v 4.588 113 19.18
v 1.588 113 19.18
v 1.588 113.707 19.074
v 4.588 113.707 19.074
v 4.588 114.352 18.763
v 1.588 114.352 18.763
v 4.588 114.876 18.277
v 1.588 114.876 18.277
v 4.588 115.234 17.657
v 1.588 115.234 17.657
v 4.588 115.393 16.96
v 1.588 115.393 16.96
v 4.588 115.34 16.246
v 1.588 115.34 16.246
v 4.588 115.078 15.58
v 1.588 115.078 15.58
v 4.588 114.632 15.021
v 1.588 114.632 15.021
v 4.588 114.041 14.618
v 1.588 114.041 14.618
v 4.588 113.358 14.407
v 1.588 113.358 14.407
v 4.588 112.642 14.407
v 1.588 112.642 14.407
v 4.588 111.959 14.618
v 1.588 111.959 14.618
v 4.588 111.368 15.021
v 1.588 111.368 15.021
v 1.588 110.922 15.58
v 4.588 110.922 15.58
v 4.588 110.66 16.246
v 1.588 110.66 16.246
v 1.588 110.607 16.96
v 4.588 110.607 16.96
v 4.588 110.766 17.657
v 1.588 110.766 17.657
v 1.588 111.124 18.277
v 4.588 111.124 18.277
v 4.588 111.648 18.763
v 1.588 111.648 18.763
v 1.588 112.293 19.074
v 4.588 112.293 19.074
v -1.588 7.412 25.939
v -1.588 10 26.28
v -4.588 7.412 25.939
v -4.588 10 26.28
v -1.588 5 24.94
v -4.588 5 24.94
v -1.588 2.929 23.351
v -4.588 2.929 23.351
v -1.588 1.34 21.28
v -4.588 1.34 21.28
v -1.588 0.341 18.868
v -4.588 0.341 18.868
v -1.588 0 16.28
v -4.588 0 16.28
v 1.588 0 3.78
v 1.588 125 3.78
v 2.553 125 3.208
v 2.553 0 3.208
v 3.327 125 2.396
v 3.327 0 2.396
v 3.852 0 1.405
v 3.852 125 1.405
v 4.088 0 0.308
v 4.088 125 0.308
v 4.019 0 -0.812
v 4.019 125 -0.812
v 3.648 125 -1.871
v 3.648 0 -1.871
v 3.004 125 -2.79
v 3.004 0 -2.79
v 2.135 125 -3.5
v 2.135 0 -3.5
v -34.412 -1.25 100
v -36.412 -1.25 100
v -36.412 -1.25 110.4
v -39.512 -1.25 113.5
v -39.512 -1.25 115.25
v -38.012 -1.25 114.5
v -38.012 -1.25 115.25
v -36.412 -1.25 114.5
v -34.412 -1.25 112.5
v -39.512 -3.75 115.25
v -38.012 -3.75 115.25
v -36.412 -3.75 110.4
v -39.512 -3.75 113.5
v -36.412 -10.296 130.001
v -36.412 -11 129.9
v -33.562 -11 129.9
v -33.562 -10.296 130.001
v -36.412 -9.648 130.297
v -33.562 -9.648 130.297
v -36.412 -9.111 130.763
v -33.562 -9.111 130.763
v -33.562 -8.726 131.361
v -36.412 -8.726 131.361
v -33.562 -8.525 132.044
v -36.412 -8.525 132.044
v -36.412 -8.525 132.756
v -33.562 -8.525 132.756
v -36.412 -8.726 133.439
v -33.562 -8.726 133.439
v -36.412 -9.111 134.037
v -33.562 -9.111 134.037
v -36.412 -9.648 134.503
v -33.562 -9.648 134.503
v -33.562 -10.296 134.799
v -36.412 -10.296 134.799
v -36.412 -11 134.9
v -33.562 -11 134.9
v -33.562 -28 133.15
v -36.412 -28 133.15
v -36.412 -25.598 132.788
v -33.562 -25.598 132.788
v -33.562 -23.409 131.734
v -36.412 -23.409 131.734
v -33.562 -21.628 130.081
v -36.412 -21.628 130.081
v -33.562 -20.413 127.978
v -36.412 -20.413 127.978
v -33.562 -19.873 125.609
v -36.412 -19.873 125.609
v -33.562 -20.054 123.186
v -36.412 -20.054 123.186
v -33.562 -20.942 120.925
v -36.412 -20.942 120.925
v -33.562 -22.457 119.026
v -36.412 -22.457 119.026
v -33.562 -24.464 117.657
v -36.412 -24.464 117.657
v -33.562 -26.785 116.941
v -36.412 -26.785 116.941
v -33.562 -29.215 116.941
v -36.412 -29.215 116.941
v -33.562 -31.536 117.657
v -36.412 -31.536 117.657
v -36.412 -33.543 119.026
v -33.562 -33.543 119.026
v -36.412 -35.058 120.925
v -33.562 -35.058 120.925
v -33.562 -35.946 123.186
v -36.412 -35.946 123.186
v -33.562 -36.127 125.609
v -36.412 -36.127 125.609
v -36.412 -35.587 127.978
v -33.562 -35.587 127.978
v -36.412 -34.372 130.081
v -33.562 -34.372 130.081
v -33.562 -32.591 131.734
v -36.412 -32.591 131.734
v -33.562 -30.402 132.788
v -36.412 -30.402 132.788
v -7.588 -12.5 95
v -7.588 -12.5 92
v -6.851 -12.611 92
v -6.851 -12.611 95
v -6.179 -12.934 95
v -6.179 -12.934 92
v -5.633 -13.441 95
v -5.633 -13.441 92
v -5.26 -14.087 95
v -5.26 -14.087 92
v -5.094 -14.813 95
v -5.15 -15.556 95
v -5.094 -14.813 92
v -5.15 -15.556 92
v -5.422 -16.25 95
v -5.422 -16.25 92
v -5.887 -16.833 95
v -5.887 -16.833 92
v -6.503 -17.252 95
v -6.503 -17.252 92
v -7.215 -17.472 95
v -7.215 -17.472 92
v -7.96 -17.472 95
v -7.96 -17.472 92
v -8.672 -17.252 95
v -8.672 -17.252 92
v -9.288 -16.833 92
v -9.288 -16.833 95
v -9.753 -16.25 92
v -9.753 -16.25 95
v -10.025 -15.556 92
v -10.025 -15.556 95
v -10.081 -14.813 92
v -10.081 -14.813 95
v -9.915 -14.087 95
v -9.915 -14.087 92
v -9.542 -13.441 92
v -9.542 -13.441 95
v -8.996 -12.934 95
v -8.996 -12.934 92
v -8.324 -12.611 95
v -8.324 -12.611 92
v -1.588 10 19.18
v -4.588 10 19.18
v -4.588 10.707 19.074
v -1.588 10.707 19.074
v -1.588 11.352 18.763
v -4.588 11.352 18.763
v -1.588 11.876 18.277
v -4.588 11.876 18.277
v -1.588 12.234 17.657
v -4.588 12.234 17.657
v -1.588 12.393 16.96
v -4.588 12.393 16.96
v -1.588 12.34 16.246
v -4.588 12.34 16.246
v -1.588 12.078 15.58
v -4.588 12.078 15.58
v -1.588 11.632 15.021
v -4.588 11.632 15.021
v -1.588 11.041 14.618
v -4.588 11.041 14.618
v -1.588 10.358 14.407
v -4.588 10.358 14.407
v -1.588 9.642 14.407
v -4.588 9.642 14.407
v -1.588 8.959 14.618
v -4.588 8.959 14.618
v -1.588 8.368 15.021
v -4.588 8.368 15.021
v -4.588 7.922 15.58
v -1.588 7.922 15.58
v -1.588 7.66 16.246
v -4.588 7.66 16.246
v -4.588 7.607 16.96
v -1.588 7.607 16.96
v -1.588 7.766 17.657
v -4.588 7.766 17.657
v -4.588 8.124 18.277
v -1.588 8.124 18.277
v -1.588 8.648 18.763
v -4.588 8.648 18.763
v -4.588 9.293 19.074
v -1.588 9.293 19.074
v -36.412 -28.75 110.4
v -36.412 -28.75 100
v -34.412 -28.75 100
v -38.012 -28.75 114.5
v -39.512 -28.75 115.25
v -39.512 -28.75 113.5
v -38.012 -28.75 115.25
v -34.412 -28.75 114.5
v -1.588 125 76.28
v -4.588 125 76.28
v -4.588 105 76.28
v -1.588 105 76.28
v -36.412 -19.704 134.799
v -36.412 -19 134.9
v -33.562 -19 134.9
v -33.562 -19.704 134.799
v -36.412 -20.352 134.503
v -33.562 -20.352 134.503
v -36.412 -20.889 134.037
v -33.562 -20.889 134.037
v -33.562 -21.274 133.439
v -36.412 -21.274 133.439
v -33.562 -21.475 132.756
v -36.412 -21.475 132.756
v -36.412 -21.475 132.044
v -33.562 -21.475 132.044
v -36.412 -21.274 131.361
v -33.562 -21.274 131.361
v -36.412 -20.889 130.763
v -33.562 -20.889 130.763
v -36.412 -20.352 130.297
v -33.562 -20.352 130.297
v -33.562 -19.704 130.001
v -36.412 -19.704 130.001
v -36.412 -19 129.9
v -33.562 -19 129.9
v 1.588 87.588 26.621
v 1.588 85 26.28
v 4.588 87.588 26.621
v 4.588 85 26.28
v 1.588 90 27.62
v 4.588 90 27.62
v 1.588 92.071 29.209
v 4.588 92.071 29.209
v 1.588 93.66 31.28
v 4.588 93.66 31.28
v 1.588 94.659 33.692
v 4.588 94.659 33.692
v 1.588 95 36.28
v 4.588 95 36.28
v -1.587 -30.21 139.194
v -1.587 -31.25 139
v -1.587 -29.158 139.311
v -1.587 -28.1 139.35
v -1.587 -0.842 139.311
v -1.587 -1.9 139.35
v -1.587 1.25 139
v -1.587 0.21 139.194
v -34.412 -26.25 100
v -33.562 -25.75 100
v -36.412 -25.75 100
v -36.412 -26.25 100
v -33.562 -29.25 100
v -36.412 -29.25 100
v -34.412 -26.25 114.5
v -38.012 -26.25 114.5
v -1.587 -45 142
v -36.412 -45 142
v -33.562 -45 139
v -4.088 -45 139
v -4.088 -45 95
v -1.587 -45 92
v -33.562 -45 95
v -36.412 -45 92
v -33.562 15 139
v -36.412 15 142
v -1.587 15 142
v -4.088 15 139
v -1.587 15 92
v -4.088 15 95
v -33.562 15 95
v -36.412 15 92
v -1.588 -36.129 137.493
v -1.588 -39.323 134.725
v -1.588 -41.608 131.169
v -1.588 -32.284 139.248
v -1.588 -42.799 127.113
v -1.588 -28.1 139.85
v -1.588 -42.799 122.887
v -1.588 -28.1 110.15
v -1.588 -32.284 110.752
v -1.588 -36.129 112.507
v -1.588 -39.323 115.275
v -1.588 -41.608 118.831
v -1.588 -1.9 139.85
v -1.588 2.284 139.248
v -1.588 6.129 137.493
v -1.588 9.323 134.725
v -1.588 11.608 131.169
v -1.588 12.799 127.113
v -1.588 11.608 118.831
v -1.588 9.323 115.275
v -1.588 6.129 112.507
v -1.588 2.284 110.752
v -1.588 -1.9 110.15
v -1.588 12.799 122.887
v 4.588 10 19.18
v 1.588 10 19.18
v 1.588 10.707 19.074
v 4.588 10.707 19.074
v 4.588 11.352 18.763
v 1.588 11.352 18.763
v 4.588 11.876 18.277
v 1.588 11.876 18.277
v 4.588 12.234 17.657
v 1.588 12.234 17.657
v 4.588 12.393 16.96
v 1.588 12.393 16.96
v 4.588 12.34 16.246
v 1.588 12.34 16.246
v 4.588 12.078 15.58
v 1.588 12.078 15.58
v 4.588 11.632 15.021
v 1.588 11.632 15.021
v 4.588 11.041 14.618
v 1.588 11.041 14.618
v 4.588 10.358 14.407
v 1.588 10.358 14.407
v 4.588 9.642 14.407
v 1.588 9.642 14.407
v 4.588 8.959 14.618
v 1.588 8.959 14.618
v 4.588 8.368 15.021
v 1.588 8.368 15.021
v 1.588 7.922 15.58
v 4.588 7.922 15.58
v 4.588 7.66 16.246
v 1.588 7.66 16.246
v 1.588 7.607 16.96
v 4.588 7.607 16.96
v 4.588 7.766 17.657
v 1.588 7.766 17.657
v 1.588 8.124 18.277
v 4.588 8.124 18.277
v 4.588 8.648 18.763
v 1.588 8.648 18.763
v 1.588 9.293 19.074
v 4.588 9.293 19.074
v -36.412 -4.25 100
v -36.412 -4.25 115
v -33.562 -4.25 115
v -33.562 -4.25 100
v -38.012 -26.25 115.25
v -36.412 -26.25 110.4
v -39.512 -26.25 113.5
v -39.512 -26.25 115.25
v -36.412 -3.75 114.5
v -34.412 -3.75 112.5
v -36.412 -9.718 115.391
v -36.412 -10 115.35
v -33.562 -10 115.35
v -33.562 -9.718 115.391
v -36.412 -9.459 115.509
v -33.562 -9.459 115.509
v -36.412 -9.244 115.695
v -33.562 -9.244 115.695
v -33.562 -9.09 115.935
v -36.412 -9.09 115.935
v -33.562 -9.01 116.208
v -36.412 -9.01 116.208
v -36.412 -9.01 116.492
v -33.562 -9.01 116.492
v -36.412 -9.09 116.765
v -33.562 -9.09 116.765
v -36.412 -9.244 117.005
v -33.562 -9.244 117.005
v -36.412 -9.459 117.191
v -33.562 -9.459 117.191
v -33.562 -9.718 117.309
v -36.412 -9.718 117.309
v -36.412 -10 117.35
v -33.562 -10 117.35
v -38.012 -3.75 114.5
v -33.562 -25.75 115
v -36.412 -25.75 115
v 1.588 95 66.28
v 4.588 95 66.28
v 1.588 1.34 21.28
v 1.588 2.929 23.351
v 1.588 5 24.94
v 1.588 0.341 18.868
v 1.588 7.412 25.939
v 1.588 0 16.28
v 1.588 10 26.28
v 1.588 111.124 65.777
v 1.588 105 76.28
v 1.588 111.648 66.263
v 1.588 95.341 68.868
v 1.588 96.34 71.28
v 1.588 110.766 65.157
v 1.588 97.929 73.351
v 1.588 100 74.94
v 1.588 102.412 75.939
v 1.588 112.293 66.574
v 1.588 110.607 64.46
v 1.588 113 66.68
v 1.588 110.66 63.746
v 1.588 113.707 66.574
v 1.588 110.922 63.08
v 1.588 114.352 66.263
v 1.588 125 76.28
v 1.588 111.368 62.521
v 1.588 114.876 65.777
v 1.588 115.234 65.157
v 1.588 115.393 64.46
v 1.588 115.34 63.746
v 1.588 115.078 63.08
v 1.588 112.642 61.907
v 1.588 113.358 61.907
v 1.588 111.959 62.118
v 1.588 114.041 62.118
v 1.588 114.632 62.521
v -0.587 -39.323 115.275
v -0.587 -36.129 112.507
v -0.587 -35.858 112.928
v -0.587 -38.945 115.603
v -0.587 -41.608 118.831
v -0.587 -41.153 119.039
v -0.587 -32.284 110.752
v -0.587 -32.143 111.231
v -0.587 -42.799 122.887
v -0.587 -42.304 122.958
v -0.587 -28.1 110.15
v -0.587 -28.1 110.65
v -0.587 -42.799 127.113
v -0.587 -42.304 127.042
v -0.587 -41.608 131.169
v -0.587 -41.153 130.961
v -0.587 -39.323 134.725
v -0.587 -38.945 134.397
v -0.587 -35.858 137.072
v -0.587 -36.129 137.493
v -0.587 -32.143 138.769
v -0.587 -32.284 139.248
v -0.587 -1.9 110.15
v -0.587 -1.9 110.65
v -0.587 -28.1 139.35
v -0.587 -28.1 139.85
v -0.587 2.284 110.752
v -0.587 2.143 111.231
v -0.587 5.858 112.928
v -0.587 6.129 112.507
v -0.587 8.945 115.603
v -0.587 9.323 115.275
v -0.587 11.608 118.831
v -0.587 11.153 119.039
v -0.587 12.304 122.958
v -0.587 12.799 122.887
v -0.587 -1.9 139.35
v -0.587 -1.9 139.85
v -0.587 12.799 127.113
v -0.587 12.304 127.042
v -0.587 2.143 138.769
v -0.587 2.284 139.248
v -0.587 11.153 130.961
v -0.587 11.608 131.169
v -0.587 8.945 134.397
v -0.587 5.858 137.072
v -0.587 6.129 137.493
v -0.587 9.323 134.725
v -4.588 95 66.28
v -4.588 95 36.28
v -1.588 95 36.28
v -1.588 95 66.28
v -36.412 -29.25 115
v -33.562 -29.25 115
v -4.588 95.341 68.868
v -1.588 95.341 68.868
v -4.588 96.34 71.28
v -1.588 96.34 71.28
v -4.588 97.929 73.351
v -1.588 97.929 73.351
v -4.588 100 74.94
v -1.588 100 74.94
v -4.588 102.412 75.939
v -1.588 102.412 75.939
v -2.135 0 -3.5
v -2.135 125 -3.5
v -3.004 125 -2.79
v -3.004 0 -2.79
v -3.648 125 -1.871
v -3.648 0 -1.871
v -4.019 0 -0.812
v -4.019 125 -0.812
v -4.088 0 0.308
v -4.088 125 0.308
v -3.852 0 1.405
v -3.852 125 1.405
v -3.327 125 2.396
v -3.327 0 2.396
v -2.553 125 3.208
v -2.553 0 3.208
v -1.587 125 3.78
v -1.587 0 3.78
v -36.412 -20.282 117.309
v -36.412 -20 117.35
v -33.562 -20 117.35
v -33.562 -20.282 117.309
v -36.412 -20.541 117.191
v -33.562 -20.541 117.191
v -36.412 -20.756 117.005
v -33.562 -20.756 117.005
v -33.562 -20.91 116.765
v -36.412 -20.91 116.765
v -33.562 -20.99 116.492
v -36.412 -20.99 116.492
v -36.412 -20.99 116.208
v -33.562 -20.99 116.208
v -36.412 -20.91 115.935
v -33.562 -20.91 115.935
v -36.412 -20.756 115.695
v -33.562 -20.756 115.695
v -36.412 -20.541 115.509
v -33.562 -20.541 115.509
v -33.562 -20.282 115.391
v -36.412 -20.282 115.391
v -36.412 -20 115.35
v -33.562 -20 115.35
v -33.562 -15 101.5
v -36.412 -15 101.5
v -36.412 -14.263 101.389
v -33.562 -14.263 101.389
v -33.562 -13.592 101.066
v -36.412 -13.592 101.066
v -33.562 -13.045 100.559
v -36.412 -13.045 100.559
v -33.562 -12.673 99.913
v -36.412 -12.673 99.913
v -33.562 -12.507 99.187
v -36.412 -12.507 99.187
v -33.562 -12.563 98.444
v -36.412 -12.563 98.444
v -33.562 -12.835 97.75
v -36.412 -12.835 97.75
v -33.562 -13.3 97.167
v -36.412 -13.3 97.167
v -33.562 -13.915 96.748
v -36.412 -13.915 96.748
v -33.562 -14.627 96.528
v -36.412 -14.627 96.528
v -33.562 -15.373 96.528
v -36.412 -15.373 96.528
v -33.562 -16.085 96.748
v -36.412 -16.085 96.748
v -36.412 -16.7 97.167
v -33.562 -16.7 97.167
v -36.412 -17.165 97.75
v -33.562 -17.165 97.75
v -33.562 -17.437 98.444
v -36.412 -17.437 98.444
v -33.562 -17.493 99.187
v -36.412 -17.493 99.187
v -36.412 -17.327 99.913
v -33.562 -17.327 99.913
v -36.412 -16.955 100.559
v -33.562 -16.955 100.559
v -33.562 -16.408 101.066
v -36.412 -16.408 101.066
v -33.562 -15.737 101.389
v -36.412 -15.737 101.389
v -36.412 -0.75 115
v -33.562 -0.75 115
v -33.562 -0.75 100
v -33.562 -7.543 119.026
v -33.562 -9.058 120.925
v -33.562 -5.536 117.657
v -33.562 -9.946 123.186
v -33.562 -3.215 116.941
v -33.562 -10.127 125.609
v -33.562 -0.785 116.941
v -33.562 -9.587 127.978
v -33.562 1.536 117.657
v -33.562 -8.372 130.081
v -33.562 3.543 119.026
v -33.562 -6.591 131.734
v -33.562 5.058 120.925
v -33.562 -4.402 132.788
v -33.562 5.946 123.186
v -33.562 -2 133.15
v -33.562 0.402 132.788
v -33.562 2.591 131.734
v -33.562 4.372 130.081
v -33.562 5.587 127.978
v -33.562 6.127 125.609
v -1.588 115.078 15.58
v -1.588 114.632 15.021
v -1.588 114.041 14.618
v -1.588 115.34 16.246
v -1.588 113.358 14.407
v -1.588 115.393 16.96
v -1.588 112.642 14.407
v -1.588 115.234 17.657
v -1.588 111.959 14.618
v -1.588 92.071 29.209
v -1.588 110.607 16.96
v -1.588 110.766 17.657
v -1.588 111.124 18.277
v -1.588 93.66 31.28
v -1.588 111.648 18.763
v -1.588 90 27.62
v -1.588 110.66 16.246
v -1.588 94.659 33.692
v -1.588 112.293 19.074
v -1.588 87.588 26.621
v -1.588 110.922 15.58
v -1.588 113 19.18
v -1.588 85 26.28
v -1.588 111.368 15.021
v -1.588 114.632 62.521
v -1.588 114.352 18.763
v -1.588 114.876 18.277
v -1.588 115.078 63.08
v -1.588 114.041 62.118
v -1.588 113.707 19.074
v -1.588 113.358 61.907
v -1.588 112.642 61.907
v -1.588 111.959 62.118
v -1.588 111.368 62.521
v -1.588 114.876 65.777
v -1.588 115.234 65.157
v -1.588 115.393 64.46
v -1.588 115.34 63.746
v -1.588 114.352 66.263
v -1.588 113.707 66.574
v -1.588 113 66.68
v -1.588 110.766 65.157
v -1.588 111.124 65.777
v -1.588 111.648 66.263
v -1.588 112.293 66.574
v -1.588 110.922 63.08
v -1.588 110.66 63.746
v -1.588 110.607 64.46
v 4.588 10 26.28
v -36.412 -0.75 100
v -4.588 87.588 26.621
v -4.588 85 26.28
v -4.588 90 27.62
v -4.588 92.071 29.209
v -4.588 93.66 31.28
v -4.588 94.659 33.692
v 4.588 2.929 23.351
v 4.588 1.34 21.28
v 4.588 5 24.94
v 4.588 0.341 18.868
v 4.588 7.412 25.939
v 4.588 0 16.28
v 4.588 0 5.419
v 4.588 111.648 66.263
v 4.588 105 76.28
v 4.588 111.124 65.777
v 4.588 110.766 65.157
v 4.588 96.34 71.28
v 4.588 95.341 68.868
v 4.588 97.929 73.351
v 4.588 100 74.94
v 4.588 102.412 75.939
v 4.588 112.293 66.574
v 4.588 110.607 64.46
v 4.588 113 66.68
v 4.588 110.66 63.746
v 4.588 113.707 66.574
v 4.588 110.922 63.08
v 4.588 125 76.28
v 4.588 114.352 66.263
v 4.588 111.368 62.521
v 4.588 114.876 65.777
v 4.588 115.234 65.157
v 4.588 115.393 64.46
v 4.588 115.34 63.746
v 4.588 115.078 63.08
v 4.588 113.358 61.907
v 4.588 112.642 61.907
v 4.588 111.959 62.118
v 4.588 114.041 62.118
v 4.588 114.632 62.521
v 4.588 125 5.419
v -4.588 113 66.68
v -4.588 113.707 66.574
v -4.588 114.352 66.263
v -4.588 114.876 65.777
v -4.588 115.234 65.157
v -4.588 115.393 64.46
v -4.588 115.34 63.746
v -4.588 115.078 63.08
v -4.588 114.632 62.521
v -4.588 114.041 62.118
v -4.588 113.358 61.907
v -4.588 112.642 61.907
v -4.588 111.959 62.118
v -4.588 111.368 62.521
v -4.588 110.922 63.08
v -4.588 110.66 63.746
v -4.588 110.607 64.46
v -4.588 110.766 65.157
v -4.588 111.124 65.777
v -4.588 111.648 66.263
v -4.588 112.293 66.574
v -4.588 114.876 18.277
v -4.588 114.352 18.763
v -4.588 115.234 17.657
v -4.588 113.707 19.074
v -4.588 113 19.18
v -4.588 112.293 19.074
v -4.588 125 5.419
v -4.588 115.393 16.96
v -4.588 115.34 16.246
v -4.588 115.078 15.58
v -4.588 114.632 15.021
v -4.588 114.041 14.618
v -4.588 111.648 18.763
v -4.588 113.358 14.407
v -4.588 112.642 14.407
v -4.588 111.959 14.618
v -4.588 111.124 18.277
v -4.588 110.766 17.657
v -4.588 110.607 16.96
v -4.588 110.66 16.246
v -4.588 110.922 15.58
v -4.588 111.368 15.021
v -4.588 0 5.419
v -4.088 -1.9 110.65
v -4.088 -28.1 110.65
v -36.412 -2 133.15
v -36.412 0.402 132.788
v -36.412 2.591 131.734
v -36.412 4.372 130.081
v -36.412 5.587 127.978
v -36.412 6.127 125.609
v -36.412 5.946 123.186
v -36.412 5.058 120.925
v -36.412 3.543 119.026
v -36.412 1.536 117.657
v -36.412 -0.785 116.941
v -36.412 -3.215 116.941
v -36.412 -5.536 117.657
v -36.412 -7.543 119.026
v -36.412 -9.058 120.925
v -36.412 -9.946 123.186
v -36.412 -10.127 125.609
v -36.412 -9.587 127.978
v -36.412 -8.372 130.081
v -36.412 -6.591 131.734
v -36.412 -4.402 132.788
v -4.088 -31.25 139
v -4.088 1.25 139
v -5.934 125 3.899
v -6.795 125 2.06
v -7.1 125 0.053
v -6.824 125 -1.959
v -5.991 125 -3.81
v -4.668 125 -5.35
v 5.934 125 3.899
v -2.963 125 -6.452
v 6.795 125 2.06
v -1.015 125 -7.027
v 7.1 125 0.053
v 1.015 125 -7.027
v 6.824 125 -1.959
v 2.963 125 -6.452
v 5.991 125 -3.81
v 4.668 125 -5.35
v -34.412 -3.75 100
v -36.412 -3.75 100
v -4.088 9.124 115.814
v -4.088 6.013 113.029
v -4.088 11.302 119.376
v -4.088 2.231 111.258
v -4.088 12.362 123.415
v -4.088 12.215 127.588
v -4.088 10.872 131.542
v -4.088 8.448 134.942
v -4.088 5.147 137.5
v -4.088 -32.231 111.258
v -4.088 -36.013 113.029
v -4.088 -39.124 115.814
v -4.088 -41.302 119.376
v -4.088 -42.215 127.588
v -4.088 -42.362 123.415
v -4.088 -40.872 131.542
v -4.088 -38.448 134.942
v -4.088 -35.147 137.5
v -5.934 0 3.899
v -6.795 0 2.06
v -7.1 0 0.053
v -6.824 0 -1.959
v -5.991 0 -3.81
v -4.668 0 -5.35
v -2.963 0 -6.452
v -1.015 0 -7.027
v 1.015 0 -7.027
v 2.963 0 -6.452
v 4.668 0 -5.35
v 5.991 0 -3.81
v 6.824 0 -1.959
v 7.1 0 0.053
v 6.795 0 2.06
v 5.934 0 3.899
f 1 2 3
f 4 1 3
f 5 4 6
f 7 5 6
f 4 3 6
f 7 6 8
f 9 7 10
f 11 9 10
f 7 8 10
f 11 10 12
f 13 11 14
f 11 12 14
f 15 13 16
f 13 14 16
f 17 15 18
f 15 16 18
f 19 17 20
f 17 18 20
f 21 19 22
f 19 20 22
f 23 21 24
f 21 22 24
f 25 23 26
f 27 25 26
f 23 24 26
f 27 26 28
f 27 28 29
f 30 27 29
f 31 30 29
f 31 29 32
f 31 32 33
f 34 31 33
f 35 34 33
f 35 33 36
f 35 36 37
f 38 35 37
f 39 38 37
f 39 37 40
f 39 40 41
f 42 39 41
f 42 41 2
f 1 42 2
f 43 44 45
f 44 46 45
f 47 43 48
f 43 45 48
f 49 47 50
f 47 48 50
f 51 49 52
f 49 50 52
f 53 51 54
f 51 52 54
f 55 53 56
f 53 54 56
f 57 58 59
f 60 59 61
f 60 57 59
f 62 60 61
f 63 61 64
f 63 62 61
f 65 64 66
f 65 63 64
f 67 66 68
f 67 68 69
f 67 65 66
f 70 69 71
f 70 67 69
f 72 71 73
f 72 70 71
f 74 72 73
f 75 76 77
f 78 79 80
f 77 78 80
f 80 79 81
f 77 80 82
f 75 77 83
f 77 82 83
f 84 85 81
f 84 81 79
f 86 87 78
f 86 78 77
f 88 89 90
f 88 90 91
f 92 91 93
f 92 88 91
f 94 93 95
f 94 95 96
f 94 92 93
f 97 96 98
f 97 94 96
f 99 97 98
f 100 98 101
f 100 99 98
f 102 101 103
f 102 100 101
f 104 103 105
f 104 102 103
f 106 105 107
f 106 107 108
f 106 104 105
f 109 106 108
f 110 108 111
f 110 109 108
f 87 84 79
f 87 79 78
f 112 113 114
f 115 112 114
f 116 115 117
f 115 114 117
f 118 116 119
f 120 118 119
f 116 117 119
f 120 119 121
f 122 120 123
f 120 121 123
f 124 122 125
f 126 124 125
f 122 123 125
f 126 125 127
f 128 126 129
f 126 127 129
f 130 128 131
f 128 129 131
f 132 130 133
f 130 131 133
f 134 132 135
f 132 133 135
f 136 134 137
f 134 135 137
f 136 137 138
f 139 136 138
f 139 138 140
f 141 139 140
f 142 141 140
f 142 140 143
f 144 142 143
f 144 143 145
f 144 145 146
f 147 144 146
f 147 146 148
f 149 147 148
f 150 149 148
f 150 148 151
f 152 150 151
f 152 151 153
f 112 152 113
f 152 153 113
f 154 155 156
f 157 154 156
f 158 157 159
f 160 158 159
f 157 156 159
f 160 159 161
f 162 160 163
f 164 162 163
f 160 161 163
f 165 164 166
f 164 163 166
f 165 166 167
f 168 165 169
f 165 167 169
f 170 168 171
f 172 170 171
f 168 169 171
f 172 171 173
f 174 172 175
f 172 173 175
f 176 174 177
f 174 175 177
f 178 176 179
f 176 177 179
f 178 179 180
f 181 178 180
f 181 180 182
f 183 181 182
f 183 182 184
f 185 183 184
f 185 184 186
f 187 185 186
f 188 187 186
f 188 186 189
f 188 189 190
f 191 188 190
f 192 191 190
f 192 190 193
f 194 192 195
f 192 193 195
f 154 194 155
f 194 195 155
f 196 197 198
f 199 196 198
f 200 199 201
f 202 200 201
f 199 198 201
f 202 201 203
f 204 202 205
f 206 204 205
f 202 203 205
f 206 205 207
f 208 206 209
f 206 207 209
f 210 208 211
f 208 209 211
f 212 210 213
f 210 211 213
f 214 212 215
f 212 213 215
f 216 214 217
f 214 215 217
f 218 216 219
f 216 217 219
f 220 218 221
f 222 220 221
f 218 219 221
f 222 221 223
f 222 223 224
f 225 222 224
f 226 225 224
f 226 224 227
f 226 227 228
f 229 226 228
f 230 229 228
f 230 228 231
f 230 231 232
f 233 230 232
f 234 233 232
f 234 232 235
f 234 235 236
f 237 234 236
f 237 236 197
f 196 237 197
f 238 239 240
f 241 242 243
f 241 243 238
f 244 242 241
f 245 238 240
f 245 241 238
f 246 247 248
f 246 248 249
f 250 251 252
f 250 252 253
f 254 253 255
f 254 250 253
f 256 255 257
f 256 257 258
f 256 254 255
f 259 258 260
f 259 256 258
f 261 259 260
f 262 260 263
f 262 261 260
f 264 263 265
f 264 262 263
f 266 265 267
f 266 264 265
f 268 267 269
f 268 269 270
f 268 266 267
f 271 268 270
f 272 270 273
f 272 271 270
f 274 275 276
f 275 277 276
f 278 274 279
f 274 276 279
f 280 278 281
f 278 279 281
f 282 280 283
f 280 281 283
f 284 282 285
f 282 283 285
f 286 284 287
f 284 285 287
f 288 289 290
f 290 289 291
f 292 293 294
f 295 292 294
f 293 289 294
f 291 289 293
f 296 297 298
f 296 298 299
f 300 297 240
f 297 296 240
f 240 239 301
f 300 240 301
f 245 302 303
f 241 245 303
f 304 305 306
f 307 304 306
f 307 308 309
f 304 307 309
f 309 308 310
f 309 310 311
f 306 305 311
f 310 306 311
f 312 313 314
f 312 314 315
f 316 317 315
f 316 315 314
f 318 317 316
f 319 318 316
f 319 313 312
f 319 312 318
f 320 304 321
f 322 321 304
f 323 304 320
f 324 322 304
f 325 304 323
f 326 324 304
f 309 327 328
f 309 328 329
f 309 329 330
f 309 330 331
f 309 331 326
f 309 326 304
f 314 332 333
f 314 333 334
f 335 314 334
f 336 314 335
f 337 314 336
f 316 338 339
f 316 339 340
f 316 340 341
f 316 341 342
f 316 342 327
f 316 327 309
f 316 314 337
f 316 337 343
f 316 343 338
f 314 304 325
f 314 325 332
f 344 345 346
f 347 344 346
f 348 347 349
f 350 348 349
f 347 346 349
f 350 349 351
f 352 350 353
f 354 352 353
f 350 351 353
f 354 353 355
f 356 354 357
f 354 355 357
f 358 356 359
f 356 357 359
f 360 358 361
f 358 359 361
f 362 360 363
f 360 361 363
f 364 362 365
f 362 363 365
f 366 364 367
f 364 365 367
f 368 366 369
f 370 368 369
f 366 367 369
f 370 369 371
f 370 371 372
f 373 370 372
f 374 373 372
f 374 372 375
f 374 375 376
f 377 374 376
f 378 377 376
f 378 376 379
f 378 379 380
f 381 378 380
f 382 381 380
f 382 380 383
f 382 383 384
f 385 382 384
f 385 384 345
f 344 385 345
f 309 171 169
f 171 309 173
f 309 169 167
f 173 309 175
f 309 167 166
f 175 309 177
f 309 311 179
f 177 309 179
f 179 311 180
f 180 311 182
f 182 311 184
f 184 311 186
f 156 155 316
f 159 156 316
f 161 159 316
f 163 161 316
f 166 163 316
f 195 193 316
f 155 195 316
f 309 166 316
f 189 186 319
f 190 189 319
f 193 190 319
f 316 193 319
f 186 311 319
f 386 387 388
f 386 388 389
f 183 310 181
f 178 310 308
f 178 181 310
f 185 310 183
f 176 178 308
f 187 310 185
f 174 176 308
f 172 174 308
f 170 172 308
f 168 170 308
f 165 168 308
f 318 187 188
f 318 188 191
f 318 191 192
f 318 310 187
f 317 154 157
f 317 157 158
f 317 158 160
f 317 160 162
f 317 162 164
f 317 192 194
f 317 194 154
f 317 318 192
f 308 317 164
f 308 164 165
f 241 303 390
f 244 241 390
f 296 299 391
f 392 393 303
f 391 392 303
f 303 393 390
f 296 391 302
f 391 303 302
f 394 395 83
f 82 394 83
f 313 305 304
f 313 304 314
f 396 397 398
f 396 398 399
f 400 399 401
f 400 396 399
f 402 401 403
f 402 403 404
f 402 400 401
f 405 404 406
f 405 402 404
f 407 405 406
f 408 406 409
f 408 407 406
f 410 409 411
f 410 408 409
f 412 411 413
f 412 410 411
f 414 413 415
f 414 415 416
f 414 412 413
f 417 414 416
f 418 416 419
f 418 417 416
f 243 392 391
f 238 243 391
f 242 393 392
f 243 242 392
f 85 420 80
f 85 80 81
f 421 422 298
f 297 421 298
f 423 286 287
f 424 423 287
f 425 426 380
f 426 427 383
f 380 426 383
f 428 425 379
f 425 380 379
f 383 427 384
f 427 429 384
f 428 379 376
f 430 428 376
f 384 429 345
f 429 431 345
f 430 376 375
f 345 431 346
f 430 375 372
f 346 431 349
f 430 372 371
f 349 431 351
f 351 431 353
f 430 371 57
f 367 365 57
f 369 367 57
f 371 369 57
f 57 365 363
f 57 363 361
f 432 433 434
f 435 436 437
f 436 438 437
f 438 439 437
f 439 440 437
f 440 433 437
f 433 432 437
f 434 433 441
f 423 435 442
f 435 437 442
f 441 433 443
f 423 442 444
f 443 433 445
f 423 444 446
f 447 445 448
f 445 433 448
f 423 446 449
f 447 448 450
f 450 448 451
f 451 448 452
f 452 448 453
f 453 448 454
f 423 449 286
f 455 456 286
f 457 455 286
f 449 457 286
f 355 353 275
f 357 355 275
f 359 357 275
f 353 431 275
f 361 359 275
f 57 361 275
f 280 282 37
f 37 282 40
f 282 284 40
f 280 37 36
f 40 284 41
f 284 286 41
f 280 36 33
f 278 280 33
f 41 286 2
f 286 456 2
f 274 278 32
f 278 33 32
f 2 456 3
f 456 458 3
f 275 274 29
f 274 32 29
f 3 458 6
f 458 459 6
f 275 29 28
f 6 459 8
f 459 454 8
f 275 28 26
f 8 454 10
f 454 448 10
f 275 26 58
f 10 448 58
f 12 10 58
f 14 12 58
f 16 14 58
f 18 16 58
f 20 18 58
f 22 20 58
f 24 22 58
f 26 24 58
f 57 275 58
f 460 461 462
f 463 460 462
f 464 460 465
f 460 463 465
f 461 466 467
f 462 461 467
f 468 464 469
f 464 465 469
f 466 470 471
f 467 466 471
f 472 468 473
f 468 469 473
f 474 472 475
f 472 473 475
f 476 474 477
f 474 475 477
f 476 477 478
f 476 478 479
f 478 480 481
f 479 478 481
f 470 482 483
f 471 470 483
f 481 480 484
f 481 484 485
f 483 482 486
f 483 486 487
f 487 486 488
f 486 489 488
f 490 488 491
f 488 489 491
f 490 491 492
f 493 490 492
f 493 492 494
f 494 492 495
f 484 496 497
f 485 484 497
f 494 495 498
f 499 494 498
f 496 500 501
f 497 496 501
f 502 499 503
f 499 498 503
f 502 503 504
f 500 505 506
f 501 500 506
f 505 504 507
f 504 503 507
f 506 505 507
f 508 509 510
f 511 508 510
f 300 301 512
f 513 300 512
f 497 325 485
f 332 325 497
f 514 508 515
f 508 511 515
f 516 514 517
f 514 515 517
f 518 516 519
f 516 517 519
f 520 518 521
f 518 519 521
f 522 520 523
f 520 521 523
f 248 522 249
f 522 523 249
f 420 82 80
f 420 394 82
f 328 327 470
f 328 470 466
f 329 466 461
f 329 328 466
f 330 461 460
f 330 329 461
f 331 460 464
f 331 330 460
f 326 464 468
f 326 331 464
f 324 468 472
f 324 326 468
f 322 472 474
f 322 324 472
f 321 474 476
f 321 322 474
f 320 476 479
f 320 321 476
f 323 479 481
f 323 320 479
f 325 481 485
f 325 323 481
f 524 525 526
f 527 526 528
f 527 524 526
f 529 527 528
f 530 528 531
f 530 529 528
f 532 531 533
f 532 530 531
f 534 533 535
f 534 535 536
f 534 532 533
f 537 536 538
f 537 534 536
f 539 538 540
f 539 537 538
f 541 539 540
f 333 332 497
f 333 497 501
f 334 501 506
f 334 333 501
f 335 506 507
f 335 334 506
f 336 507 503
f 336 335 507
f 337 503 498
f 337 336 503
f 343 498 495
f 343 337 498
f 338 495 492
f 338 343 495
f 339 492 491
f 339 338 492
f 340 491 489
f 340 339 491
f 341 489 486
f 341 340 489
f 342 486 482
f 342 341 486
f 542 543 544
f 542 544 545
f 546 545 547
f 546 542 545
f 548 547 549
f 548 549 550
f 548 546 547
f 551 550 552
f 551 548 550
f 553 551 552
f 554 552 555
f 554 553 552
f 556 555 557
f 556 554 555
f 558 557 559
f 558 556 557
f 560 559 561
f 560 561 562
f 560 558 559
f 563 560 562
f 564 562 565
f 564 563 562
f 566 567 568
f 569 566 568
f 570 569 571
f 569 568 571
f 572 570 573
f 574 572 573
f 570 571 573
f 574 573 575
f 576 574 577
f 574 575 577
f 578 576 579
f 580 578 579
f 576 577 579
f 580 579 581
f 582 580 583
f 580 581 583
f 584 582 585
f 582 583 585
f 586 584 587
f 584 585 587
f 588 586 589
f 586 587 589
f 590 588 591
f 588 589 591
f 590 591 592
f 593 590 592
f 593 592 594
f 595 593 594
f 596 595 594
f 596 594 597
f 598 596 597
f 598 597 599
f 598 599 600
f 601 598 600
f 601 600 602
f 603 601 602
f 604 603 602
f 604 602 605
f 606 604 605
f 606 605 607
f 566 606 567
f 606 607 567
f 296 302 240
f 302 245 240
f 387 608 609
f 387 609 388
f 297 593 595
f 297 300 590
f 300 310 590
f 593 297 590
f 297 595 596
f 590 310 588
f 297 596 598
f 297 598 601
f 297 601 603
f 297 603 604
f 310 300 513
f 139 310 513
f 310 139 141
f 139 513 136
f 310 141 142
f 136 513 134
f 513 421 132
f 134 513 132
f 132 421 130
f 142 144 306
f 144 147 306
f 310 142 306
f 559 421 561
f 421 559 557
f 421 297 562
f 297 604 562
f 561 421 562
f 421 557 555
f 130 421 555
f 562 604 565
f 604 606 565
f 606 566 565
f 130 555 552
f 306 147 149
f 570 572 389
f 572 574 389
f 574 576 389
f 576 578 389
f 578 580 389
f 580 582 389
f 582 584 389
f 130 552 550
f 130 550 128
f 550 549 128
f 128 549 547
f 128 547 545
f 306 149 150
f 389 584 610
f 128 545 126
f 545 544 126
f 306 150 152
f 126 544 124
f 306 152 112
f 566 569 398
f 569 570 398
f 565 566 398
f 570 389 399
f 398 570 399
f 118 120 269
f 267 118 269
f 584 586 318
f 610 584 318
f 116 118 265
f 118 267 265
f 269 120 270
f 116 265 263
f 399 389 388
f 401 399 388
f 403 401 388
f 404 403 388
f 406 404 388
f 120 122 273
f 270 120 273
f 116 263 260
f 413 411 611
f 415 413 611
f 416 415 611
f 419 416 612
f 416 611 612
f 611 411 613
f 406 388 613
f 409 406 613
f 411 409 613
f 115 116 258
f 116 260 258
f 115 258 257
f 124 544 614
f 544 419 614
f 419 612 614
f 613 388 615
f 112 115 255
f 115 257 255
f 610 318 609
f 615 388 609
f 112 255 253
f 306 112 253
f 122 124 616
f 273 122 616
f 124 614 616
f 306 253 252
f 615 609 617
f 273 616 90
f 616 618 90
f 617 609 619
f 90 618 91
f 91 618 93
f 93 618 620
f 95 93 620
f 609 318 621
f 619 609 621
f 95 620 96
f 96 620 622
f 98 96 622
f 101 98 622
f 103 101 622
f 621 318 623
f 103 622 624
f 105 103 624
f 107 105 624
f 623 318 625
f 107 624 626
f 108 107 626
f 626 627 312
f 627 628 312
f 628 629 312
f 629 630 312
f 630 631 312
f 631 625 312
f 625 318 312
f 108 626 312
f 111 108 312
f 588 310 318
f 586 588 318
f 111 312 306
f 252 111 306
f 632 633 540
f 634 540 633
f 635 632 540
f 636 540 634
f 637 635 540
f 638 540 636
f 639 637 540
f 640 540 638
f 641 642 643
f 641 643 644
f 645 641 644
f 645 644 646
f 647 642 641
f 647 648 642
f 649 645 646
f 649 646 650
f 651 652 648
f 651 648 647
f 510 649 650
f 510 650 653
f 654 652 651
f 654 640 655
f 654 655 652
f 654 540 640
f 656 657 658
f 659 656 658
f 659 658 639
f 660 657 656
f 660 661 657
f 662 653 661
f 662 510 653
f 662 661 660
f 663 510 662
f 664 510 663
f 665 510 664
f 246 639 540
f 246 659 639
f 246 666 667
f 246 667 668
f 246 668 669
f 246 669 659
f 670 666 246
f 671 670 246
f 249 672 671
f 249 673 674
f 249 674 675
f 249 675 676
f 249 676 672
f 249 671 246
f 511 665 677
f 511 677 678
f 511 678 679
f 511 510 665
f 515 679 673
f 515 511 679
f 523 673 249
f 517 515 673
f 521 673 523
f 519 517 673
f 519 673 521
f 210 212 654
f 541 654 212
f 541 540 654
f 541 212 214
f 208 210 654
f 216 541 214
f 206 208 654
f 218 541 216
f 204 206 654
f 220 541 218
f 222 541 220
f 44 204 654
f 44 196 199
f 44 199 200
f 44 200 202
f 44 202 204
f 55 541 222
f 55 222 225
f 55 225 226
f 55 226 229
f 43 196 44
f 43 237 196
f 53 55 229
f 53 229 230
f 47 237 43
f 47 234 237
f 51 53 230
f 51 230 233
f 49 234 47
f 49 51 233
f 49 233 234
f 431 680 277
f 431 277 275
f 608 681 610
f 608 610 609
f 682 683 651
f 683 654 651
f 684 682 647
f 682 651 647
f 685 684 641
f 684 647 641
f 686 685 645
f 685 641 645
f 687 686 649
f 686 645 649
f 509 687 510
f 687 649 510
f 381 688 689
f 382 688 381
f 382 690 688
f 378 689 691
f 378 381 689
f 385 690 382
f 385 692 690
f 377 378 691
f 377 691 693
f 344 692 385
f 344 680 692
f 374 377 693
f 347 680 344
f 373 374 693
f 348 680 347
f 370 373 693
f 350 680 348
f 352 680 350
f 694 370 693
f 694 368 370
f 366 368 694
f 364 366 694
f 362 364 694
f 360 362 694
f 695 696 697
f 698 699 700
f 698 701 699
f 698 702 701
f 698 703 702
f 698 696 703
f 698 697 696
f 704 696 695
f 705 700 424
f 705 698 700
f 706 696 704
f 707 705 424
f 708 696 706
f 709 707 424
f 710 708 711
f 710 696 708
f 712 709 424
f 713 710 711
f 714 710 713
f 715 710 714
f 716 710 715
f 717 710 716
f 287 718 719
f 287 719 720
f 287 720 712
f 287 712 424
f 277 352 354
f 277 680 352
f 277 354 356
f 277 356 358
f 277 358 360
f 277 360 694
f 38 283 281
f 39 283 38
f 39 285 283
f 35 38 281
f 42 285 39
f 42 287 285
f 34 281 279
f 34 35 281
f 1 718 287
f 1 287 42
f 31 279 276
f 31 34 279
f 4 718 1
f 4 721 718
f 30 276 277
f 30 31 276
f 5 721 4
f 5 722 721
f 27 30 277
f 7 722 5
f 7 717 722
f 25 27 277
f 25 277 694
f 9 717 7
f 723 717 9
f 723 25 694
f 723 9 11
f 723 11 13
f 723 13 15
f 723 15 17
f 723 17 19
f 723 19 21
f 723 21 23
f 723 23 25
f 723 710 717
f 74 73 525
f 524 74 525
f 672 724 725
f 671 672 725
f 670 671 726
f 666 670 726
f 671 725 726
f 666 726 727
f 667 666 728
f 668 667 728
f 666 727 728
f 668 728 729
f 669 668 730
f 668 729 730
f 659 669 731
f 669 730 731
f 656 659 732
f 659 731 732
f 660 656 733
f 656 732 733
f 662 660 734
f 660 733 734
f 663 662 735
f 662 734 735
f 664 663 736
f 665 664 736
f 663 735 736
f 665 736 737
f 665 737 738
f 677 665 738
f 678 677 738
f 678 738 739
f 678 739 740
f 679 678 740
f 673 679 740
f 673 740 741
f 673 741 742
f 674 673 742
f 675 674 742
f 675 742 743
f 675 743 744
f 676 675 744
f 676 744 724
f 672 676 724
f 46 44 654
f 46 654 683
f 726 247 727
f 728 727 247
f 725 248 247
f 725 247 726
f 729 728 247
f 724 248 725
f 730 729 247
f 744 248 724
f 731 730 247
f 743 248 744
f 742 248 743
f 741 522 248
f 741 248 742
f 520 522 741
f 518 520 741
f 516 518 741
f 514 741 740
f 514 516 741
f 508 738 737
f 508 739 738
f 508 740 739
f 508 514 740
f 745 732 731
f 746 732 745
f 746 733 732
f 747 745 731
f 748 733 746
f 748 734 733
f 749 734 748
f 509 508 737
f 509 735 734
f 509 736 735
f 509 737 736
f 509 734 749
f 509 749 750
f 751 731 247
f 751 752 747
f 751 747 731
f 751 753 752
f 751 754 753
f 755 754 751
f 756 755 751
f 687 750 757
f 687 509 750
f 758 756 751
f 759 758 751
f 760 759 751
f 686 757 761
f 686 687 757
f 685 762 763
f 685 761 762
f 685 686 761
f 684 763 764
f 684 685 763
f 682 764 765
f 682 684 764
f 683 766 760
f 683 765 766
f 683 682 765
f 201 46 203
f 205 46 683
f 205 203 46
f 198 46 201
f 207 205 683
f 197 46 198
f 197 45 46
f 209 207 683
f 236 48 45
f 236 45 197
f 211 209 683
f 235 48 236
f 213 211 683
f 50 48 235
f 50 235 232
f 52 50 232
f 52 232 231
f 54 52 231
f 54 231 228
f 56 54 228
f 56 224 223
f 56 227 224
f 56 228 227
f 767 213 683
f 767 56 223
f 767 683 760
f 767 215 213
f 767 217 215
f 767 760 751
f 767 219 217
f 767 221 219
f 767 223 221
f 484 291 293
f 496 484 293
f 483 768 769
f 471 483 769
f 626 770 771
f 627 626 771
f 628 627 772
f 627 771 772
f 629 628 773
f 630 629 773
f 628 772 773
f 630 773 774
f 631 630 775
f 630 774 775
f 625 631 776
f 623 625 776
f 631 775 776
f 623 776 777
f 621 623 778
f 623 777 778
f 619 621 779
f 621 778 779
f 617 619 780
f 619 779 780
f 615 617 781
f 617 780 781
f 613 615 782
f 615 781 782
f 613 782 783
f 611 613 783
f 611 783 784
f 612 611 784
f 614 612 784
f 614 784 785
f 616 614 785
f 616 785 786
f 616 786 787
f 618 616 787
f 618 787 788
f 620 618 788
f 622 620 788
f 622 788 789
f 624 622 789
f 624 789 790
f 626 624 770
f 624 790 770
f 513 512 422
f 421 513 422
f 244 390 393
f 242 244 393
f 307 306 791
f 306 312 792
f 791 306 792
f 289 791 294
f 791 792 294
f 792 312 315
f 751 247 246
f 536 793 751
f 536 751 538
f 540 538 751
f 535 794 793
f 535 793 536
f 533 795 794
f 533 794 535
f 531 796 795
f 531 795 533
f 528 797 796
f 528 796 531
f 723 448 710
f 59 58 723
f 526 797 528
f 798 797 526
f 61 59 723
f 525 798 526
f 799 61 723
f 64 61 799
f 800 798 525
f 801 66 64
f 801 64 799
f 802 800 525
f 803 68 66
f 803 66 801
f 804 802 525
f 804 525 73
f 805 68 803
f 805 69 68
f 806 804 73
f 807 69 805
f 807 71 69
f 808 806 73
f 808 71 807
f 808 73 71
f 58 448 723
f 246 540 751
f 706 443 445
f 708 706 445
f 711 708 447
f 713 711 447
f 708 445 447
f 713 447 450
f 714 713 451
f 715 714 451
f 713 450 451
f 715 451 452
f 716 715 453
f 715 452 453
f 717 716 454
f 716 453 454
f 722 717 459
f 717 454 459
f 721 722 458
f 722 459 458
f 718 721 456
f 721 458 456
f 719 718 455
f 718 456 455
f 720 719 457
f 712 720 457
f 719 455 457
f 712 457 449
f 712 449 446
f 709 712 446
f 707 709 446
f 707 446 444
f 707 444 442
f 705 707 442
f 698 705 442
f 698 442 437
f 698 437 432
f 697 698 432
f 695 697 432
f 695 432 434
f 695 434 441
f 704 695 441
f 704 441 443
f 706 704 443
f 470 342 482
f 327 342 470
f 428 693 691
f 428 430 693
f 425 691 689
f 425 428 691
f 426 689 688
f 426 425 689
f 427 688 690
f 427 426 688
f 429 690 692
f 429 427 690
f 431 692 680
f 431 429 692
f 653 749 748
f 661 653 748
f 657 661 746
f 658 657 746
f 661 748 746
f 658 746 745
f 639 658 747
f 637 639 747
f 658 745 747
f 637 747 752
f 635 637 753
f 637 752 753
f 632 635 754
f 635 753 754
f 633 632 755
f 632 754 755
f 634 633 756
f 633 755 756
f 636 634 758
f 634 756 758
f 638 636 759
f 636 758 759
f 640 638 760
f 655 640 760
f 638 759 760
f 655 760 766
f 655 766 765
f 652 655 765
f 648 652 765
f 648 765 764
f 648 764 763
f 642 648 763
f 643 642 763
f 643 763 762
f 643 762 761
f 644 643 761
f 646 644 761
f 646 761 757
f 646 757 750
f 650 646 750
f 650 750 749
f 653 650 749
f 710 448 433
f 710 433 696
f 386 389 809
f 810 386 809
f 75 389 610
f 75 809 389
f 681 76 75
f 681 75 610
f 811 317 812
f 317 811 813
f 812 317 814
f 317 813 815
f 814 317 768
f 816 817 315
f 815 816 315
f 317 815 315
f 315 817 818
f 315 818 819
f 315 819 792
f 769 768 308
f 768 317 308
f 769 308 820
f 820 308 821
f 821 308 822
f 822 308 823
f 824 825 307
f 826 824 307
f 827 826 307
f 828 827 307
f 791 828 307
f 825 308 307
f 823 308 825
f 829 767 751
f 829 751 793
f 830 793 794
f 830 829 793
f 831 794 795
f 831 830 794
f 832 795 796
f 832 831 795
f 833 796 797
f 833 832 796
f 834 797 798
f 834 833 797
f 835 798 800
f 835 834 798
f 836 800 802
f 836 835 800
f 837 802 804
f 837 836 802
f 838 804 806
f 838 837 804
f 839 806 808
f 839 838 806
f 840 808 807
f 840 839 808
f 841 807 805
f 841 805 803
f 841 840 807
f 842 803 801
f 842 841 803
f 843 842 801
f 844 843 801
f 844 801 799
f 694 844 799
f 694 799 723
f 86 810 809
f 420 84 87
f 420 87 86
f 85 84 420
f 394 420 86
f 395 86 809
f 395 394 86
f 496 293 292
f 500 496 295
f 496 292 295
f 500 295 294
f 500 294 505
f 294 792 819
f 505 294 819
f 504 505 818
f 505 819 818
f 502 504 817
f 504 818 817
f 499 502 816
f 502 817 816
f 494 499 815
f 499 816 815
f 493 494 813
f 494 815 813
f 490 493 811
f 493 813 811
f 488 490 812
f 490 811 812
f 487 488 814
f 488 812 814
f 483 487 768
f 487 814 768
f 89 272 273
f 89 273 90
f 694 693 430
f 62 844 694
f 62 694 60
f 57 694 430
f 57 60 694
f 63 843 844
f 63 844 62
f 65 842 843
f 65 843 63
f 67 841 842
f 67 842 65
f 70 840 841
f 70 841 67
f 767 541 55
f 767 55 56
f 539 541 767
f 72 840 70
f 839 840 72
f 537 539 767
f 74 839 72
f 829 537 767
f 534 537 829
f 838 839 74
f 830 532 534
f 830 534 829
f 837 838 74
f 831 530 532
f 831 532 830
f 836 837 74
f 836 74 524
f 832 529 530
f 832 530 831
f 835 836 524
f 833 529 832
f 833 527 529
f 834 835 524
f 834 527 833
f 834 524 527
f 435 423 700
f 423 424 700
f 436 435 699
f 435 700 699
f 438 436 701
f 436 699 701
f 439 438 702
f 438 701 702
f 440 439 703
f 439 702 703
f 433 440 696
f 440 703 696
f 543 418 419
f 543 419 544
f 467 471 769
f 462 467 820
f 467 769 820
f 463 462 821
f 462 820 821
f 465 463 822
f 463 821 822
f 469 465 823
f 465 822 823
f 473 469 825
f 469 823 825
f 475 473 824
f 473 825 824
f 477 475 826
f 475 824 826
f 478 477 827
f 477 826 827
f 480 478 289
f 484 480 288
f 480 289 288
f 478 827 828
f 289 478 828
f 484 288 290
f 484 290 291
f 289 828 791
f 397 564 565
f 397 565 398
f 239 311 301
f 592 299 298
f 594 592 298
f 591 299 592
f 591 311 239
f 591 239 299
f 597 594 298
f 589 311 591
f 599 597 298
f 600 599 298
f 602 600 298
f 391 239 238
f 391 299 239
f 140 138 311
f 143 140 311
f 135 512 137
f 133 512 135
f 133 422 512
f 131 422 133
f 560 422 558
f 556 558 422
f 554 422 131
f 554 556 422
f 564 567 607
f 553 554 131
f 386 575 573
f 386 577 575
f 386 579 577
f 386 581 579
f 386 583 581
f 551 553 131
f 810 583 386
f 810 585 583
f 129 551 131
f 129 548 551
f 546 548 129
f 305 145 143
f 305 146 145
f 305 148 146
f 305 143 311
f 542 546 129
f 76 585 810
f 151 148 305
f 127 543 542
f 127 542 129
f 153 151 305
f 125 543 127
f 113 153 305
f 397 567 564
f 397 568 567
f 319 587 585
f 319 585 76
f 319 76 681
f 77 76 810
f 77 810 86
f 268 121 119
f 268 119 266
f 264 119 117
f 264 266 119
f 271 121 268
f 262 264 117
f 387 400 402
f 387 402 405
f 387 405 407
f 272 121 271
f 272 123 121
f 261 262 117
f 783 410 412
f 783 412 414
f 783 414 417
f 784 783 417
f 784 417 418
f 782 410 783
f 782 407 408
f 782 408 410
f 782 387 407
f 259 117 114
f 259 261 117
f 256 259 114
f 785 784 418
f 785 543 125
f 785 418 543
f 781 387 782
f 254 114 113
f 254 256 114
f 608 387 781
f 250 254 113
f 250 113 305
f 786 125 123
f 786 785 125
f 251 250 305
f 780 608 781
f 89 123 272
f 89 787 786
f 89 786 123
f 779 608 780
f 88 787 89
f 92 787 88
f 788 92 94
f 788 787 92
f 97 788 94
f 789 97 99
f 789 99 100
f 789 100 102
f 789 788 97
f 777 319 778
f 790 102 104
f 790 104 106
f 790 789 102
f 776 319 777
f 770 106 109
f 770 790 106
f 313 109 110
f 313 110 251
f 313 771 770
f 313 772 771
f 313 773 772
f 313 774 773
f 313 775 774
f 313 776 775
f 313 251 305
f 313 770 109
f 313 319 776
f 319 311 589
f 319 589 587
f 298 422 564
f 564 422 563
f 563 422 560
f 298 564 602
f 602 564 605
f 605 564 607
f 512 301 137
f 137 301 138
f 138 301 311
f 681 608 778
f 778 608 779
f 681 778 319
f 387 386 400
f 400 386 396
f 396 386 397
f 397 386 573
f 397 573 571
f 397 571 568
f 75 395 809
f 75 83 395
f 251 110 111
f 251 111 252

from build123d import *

# Parameters (mm, degrees)
BOSS_EXTRUDE1_DEPTH  = 125
SKETCH6_W            = 3
SKETCH6_H            = 50
BOSS_EXTRUDE3_DEPTH  = 30
FILLET6_R            = 10
M4_CLEARANCE_HOLE1_D = 4.8
SKETCH16_W           = 50
SKETCH16_H           = 60
SKETCH16_R           = 8.15
BOSS_EXTRUDE9_DEPTH  = 2.85
SKETCH19_W           = 2.5
SKETCH19_H           = 60
BOSS_EXTRUDE11_DEPTH = 31.975
SKETCH20_W           = 2.5
SKETCH20_H           = 50
BOSS_EXTRUDE12_DEPTH = 60
CUT_EXTRUDE3_DEPTH   = 2.5
BOSS_EXTRUDE13_DEPTH = 1
BOSS_EXTRUDE10_START = -60
SKETCH18_W           = 34.825
SKETCH18_H           = 3
BOSS_EXTRUDE10_DEPTH = 60
CUT_EXTRUDE4_DEPTH   = 2.85
BOSS_EXTRUDE16_DEPTH = 2.5
SKETCH26_W           = 15
SKETCH26_H           = 3.5
CUT_EXTRUDE5_DEPTH   = 0.85
CHAMFER4_SIZE        = 2
SKETCH27_R           = 2.5
CUT_EXTRUDE6_DEPTH   = 2.85
SKETCH28_R           = 2.5
CUT_EXTRUDE7_DEPTH   = 3


with BuildPart() as part:
    # Sketch1 → Boss-Extrude1 (new body)
    with BuildSketch(Plane(origin=(0, 0, 0), x_dir=(1, 0, 0), z_dir=(0, 1, 0))):
        with BuildLine():
            Line((-1.5875, -3.780190967), (-1.5875, -26.280190967))
            Line((-1.5875, -26.280190967), (-4.5875, -26.280190967))
            Line((-4.5875, -26.280190967), (-4.5875, -5.41893382))
            ThreePointArc((-4.5875, -5.41893382), (0, 7.1), (4.5875, -5.41893382))
            Line((4.5875, -5.41893382), (4.5875, -26.280190967))
            Line((4.5875, -26.280190967), (1.5875, -26.280190967))
            Line((1.5875, -26.280190967), (1.5875, -3.780190967))
            ThreePointArc((1.5875, -3.780190967), (4.088437399, -0.30770056), (2.13541565, 3.5))
            Line((2.13541565, 3.5), (-2.13541565, 3.5))
            ThreePointArc((-2.13541565, 3.5), (-4.088437399, -0.30770056), (-1.5875, -3.780190967))
        make_face()
    extrude(amount=BOSS_EXTRUDE1_DEPTH)

    # Sketch6 → Boss-Extrude3 (add)
    with BuildSketch(Plane(origin=(0, 125, 0), x_dir=(1, 0, 0), z_dir=(0, 1, 0))):
        with Locations((3.0875, -51.280190967)):
            Rectangle(SKETCH6_W, SKETCH6_H)
        with Locations((-3.0875, -51.280190967)):
            Rectangle(SKETCH6_W, SKETCH6_H)
    extrude(amount=-BOSS_EXTRUDE3_DEPTH)

    # Fillet6
    fillet6_edges = [part.edges().sort_by_distance(p)[0] for p in [
        (-3.0875, 0, 26.280190967),
        (3.0875, 0, 26.280190967),
        (3.0875, 95, 26.280190967),
        (3.0875, 95, 76.280190967),
        (-3.0875, 95, 26.280190967),
        (-3.0875, 95, 76.280190967),
    ]]
    fillet(fillet6_edges, radius=FILLET6_R)

    # M4 Clearance Hole1 (through all)
    with Locations(Plane(origin=(4.5875, 0, 0), x_dir=(0, 0, -1), z_dir=(1, 0, 0))):
        with Locations((-16.780190967, 113), (-16.780190967, 10), (-64.280190967, 113)):
            Hole(M4_CLEARANCE_HOLE1_D / 2)


with BuildPart() as body_2:
    # Sketch16 → Boss-Extrude9 (new body)
    with BuildSketch(Plane.ZY.offset(36.4125)):
        with Locations((117, -15)):
            Rectangle(SKETCH16_W, SKETCH16_H)
        with Locations((125, -2)):
            Circle(SKETCH16_R, mode=Mode.SUBTRACT)
        with Locations((125, -28)):
            Circle(SKETCH16_R, mode=Mode.SUBTRACT)
        with BuildLine():
            Line((134.9, -11), (134.9, -19))
            ThreePointArc((134.9, -19), (132.4, -21.5), (129.9, -19))
            Line((129.9, -19), (129.9, -11))
            ThreePointArc((129.9, -11), (132.4, -8.5), (134.9, -11))
        make_face(mode=Mode.SUBTRACT)
        with BuildLine():
            Line((117.35, -10), (117.35, -20))
            ThreePointArc((117.35, -20), (116.35, -21), (115.35, -20))
            Line((115.35, -20), (115.35, -10))
            ThreePointArc((115.35, -10), (116.35, -9), (117.35, -10))
        make_face(mode=Mode.SUBTRACT)
    extrude(amount=-BOSS_EXTRUDE9_DEPTH)

    # Sketch19 → Boss-Extrude11 (add)
    with BuildSketch(Plane(origin=(-33.5625, 0, 0), x_dir=(0, 0, -1), z_dir=(1, 0, 0))):
        with Locations((-140.75, -15)):
            Rectangle(SKETCH19_W, SKETCH19_H)
        with Locations((-93.25, -15)):
            Rectangle(SKETCH19_W, SKETCH19_H)
    extrude(amount=BOSS_EXTRUDE11_DEPTH)

    # Sketch20 → Boss-Extrude12 (add)
    with BuildSketch(Plane.XZ.offset(45)):
        with Locations((-2.8375, 117)):
            Rectangle(SKETCH20_W, SKETCH20_H)
    extrude(amount=-BOSS_EXTRUDE12_DEPTH)

    # Sketch21<2> → Cut-Extrude3 (cut)
    with BuildSketch(Plane(origin=(-1.5875, 0, 0), x_dir=(0, 0, -1), z_dir=(1, 0, 0))):
        with BuildLine():
            Line((-110.65, -1.9), (-110.65, -28.1))
            ThreePointArc((-110.65, -28.1), (-125, -42.45), (-139.35, -28.1))
            Line((-139.35, -28.1), (-139.35, -1.9))
            ThreePointArc((-139.35, -1.9), (-125, 12.45), (-110.65, -1.9))
        make_face()
    extrude(amount=-CUT_EXTRUDE3_DEPTH, mode=Mode.SUBTRACT)

    # Sketch21 → Boss-Extrude13 (add)
    with BuildSketch(Plane(origin=(-1.5875, 0, 0), x_dir=(0, 0, -1), z_dir=(1, 0, 0))):
        with BuildLine():
            Line((-110.15, -1.9), (-110.15, -28.1))
            ThreePointArc((-110.15, -28.1), (-125, -42.95), (-139.85, -28.1))
            Line((-139.85, -28.1), (-139.85, -1.9))
            ThreePointArc((-139.85, -1.9), (-125, 12.95), (-110.15, -1.9))
        make_face()
        with BuildLine():
            Line((-110.65, -1.9), (-110.65, -28.1))
            ThreePointArc((-110.65, -28.1), (-125, -42.45), (-139.35, -28.1))
            Line((-139.35, -28.1), (-139.35, -1.9))
            ThreePointArc((-139.35, -1.9), (-125, 12.45), (-110.65, -1.9))
        make_face(mode=Mode.SUBTRACT)
    extrude(amount=BOSS_EXTRUDE13_DEPTH)

    # Sketch18 → Boss-Extrude10 (add)
    with BuildSketch(Plane.XZ.offset(45).offset(BOSS_EXTRUDE10_START)):
        with Locations((-19, 140.5)):
            Rectangle(SKETCH18_W, SKETCH18_H)
        with Locations((-19, 93.5)):
            Rectangle(SKETCH18_W, SKETCH18_H)
    extrude(amount=BOSS_EXTRUDE10_DEPTH)

    # Sketch22 → Cut-Extrude4 (cut)
    with BuildSketch(Plane.ZY.offset(36.4125)):
        Polygon((100, -1.25), (100, -0.75), (115, -0.75), (115, -4.25), (100, -4.25), (100, -3.75), (114.5, -3.75), (114.5, -1.25), align=None)
    cut_extrude4 = extrude(amount=-CUT_EXTRUDE4_DEPTH, mode=Mode.SUBTRACT)

    # Sketch25 → Boss-Extrude16 (add)
    with BuildSketch(Plane.XZ.offset(3.75)):
        Polygon((-36.4125, 114.5), (-38.0125, 114.5), (-38.0125, 115.25), (-39.5125, 115.25), (-39.5125, 113.5), (-36.4125, 110.4), align=None)
    boss_extrude16 = extrude(amount=-BOSS_EXTRUDE16_DEPTH)

    # Sketch26 → Cut-Extrude5 (cut)
    with BuildSketch(Plane(origin=(-33.5625, 0, 0), x_dir=(0, 0, -1), z_dir=(1, 0, 0))):
        with Locations((-107.5, -2.5)):
            Rectangle(SKETCH26_W, SKETCH26_H)
    cut_extrude5 = extrude(amount=-CUT_EXTRUDE5_DEPTH, mode=Mode.SUBTRACT)

    # Chamfer4
    chamfer4_edges = [body_2.edges().sort_by_distance(p)[0] for p in [
        (-34.4125, -2.5, 114.5),
    ]]
    chamfer(chamfer4_edges, length=CHAMFER4_SIZE)

    # Mirror1: Cut-Extrude4, Boss-Extrude16, Cut-Extrude5 across plane
    add(cut_extrude4.mirror(Plane.ZX.offset(-15)), mode=Mode.SUBTRACT)
    add(boss_extrude16.mirror(Plane.ZX.offset(-15)))
    add(cut_extrude5.mirror(Plane.ZX.offset(-15)), mode=Mode.SUBTRACT)

    # Sketch27 → Cut-Extrude6 (cut)
    with BuildSketch(Plane.ZY.offset(36.4125)):
        with Locations((99, -15)):
            Circle(SKETCH27_R)
    extrude(amount=-CUT_EXTRUDE6_DEPTH, mode=Mode.SUBTRACT)

    # Sketch28 → Cut-Extrude7 (cut)
    with BuildSketch(Plane(origin=(0, 0, 92), x_dir=(-1, 0, 0), z_dir=(0, 0, -1))):
        with Locations(Location((7.5875, -15, 0), (0, 0, 90))):
            Circle(SKETCH28_R)
    extrude(amount=-CUT_EXTRUDE7_DEPTH, mode=Mode.SUBTRACT)


solid = Compound([part.part, body_2.part])
